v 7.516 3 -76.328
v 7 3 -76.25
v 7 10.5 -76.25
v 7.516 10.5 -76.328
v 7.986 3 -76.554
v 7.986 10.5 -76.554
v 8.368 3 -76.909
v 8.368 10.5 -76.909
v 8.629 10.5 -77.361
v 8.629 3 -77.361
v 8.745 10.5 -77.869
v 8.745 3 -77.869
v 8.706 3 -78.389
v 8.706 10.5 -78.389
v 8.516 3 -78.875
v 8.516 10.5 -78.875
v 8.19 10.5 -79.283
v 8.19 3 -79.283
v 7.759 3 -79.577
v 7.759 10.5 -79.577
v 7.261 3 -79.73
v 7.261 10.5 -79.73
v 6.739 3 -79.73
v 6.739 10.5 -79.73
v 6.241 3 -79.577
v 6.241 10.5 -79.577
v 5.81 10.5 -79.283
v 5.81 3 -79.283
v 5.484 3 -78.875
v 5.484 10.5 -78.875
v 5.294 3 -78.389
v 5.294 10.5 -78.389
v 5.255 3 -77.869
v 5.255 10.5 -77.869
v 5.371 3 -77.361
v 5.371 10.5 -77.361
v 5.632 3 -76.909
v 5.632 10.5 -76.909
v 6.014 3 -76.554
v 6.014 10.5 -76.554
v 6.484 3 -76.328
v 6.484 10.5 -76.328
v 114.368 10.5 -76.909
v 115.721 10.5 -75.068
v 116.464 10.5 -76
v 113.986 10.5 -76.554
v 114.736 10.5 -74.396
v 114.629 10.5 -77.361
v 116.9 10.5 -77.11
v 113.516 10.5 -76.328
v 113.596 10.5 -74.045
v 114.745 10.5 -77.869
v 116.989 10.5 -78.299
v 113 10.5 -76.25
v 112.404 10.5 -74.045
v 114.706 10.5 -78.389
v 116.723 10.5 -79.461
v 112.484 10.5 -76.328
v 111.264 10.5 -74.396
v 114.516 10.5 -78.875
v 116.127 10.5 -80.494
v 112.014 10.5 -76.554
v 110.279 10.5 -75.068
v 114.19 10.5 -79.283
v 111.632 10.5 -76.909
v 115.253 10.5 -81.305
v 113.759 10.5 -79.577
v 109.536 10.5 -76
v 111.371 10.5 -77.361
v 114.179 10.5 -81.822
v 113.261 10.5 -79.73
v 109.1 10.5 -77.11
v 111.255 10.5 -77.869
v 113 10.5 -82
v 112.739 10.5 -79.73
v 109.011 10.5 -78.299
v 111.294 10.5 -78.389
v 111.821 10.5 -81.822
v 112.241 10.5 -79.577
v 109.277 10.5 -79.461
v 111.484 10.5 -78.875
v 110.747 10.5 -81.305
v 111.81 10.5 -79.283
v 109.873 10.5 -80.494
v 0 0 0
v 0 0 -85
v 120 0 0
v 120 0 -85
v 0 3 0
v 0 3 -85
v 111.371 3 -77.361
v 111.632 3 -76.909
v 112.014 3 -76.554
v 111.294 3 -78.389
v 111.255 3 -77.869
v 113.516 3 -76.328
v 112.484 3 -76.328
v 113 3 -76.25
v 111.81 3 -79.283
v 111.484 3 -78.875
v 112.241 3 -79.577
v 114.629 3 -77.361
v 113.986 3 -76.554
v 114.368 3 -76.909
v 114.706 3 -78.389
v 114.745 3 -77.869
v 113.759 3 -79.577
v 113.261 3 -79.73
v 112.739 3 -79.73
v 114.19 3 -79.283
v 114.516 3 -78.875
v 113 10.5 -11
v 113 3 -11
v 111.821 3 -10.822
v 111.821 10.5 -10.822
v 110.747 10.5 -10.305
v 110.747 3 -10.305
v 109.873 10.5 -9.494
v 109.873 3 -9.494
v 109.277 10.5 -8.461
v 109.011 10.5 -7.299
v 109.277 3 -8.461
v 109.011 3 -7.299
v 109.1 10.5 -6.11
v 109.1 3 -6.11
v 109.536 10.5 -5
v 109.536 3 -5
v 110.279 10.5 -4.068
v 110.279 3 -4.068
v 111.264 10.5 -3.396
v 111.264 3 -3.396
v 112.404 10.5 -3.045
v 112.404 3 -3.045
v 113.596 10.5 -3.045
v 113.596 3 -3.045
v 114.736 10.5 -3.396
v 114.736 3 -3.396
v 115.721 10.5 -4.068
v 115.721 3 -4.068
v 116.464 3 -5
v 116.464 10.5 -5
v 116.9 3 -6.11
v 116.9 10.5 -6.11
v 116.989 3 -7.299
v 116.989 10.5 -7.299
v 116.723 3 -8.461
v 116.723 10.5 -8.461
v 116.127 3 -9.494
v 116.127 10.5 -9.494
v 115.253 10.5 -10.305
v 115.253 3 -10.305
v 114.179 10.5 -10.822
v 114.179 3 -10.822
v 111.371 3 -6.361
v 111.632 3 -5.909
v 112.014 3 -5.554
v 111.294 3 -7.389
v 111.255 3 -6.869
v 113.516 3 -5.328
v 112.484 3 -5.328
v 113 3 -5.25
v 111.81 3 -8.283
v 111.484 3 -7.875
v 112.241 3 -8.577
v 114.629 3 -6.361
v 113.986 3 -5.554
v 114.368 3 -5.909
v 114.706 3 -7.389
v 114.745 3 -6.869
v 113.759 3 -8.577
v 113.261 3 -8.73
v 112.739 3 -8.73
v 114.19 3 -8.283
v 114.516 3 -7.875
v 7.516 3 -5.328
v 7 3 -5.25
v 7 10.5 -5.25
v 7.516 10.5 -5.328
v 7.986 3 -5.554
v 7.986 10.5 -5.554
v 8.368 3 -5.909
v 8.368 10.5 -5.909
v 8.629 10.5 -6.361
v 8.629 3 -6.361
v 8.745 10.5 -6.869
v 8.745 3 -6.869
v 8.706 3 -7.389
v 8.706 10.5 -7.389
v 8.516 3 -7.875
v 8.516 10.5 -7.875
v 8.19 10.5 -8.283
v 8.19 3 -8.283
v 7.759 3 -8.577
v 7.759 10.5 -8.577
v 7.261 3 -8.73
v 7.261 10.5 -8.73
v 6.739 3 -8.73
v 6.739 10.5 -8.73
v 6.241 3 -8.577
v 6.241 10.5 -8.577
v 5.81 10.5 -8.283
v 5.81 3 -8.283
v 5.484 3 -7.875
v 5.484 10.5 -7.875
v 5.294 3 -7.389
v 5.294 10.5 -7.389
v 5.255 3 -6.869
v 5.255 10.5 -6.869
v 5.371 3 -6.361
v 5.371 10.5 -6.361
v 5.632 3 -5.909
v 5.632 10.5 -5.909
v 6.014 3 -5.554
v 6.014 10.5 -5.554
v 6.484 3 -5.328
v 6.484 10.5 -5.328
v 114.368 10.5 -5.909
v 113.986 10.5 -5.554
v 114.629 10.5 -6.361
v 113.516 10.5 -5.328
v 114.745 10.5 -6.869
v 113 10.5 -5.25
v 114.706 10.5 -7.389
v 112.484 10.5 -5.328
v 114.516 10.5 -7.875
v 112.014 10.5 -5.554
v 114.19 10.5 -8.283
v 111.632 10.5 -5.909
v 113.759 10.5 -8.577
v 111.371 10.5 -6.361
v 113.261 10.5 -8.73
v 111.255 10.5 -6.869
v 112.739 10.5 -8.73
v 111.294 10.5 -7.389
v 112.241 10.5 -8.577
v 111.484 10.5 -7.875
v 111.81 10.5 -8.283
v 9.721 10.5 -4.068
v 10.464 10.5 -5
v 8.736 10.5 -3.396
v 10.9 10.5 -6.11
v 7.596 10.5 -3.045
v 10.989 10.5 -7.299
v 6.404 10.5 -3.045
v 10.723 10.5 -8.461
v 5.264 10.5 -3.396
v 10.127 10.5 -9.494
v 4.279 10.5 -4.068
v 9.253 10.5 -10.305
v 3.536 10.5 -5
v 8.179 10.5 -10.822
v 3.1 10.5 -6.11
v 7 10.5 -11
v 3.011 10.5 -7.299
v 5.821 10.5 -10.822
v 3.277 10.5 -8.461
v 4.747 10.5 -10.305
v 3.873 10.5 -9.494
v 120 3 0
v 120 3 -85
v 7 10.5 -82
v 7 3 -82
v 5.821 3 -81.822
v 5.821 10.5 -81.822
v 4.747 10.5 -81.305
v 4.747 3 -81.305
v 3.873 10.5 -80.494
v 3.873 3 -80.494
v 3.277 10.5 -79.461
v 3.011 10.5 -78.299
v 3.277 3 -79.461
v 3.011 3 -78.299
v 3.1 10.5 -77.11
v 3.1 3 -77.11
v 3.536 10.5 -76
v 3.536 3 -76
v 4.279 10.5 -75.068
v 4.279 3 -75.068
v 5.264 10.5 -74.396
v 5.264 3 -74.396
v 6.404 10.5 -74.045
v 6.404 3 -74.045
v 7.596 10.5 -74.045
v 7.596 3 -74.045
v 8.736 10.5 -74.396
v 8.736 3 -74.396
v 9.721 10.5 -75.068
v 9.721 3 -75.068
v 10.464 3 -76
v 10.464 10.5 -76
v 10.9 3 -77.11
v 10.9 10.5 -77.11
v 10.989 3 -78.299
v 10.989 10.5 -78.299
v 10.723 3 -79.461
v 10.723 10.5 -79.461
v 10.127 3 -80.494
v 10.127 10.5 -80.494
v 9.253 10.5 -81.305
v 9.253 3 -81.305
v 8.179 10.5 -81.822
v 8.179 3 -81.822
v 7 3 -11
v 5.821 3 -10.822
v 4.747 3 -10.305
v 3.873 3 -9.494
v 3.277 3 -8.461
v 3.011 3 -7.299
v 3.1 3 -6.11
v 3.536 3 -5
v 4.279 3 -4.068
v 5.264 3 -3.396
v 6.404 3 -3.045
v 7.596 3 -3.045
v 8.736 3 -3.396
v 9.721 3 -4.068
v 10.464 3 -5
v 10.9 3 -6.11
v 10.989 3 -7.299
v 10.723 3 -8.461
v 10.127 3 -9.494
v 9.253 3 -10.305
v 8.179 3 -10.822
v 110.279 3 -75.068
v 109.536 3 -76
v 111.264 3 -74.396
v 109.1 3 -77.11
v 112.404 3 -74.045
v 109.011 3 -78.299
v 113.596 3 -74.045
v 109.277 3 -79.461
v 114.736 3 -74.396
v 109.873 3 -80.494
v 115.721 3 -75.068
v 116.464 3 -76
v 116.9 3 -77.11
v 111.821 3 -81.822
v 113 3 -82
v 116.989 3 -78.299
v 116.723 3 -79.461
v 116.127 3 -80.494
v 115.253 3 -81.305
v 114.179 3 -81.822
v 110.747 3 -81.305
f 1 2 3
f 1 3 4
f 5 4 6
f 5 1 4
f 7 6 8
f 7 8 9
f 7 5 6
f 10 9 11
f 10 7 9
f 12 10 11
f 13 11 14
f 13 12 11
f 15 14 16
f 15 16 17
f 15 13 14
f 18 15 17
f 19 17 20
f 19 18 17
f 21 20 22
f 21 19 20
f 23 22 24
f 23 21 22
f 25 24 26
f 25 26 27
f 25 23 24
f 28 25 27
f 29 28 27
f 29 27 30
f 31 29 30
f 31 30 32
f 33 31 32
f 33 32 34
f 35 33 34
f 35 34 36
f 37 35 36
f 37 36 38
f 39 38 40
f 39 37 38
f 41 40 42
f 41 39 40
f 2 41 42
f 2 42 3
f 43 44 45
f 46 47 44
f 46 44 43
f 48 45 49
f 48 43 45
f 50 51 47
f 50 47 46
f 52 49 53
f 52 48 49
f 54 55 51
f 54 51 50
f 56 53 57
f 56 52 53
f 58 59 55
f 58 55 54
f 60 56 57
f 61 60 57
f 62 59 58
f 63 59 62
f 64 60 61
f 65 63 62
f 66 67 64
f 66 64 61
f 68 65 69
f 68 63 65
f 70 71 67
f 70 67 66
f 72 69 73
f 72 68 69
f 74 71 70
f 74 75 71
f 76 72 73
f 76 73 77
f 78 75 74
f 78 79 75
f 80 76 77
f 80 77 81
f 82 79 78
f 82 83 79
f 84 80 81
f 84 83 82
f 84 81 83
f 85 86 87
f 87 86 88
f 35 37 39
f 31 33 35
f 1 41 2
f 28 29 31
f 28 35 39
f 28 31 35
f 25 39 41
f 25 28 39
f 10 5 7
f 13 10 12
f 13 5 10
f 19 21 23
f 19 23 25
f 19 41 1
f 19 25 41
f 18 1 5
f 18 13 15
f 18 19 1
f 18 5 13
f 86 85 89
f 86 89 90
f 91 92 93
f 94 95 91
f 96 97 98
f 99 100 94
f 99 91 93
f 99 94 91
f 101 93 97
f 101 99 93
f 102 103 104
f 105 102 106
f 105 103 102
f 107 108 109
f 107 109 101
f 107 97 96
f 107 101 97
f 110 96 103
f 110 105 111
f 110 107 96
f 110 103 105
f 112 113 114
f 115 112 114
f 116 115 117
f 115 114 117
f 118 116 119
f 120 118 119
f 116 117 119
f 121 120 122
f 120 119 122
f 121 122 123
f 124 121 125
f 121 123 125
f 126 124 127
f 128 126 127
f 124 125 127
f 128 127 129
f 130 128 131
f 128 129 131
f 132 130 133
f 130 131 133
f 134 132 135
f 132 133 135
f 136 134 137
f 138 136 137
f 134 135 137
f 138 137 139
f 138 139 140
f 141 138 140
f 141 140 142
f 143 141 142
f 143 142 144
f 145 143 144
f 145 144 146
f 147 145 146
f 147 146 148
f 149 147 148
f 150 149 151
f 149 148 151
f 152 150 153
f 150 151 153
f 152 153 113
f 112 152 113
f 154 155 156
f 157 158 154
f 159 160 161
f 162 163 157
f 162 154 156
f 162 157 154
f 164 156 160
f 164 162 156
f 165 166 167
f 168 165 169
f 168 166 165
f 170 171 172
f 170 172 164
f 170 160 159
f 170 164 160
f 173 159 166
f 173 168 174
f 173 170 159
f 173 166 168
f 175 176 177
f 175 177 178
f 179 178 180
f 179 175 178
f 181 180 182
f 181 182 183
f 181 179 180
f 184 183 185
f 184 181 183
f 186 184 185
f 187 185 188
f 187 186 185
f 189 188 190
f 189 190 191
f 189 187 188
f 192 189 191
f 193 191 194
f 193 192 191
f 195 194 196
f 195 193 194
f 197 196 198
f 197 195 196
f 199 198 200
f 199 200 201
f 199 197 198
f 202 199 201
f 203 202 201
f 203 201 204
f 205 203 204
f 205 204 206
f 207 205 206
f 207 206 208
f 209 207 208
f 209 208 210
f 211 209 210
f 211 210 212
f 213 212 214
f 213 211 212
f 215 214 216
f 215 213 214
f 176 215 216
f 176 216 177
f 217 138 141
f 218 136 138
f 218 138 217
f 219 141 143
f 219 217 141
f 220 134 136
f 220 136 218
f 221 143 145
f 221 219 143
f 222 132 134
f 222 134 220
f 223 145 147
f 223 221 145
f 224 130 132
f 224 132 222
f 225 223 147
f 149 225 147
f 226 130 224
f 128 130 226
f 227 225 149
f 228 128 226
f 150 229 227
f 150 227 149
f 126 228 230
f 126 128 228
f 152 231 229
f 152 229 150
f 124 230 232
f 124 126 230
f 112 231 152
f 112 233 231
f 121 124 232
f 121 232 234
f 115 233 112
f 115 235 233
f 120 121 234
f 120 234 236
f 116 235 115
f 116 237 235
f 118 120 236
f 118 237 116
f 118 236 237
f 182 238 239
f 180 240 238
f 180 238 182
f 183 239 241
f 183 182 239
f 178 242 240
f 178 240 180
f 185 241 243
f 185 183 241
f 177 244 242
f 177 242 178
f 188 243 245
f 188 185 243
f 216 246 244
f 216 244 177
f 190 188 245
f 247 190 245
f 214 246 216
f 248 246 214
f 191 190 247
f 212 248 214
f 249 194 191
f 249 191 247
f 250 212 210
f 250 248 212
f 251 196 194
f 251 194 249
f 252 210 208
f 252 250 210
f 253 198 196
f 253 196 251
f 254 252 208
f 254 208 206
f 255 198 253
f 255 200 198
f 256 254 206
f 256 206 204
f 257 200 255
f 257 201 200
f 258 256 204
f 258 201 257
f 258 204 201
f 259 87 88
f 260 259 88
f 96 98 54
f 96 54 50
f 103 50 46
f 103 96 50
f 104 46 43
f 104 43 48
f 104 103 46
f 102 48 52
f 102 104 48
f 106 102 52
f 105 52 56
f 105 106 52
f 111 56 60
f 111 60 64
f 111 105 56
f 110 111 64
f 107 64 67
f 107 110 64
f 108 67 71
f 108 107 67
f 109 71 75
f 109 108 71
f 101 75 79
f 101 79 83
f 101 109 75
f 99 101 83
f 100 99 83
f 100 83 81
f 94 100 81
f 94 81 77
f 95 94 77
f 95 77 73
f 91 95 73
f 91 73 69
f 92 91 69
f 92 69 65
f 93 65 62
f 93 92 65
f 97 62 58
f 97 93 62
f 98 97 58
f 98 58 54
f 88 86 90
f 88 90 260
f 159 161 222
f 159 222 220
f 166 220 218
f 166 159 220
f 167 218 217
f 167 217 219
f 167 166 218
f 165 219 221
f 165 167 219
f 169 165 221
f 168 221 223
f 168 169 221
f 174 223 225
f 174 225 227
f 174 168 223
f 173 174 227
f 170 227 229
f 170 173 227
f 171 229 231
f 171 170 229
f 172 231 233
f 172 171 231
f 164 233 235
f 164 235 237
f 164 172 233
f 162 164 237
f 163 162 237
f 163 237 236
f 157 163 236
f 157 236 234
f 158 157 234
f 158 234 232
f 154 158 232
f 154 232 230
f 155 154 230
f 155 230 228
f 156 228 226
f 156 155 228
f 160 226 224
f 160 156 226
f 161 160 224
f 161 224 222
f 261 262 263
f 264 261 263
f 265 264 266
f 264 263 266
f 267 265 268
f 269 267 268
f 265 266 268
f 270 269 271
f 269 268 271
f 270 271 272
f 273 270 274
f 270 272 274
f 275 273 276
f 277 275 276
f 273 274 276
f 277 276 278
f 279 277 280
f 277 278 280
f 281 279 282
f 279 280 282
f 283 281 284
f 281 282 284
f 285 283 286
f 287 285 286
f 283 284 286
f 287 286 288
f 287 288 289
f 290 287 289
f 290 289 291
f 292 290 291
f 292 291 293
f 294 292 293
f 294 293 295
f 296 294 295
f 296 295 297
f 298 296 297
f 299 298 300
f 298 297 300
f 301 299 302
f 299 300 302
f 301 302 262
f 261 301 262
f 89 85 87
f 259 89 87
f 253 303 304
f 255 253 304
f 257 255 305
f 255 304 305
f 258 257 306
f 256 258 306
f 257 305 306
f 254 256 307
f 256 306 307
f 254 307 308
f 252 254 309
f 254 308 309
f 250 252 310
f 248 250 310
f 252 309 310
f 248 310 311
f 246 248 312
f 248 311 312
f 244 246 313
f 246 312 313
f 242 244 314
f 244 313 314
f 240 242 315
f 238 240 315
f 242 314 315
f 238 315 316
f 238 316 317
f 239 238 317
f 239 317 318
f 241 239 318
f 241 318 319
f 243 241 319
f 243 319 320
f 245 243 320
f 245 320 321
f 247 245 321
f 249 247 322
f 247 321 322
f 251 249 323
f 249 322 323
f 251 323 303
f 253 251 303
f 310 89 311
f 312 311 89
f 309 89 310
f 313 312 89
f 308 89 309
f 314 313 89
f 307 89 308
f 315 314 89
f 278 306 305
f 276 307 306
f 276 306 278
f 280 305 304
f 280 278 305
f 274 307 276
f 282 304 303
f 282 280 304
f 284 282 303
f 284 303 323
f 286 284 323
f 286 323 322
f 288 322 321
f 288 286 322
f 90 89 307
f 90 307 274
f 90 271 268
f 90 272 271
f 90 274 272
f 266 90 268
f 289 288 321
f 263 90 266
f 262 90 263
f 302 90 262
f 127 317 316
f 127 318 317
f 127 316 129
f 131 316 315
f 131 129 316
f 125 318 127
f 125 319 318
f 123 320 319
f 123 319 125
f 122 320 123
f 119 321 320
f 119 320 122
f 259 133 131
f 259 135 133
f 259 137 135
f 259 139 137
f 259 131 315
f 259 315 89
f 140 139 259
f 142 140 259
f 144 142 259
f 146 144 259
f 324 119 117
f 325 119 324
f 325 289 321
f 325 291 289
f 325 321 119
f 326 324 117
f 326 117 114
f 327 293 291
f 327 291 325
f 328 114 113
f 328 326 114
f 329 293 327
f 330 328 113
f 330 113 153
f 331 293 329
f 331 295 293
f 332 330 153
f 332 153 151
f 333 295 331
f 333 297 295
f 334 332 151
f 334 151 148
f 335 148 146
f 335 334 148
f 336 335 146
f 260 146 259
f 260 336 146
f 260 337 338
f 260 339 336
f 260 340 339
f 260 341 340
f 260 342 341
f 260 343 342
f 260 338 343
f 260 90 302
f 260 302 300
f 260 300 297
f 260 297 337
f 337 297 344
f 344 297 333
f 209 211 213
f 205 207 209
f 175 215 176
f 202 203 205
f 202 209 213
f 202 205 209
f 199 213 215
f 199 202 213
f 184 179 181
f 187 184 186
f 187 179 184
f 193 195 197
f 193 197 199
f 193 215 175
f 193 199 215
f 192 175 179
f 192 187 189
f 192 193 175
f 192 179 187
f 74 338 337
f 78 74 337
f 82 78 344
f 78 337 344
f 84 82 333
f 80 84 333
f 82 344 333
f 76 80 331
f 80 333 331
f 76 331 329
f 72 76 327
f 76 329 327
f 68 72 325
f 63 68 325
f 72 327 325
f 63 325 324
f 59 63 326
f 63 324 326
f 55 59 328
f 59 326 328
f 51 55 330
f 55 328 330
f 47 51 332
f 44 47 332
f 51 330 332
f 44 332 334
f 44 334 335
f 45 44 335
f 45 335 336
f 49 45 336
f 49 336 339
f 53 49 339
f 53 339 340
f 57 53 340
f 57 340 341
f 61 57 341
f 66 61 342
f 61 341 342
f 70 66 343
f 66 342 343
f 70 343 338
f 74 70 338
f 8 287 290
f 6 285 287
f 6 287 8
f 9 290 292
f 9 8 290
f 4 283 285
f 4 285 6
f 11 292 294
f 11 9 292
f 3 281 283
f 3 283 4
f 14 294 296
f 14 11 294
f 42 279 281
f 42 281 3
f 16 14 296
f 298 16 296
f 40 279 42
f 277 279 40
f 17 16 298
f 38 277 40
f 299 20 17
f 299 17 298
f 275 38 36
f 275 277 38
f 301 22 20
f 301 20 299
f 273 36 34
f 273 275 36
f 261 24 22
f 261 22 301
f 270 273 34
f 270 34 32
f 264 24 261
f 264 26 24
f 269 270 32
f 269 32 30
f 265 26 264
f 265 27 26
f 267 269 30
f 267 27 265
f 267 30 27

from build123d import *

# Parameters (mm, degrees)
SKETCH1_W           = 120
SKETCH1_H           = 85
BOSS_EXTRUDE1_DEPTH = 3
SKETCH2_R           = 4
SKETCH2_R_2         = 1.75
BOSS_EXTRUDE2_DEPTH = 7.5


with BuildPart() as part:
    # Sketch1 → Boss-Extrude1 (new body)
    with BuildSketch(Plane(origin=(0, 0, 0), x_dir=(1, 0, 0), z_dir=(0, 1, 0))):
        with Locations((60, 42.5)):
            Rectangle(SKETCH1_W, SKETCH1_H)
    extrude(amount=BOSS_EXTRUDE1_DEPTH)

    # Sketch2 → Boss-Extrude2 (add)
    # profile 1 of 4: a face of its own
    with BuildSketch(Plane(origin=(0, 3, 0), x_dir=(1, 0, 0), z_dir=(0, 1, 0))):
        with Locations(Location((7, 78, 0), (0, 0, 90))):
            Circle(SKETCH2_R)
        with Locations(Location((7, 78, 0), (0, 0, 270))):
            Circle(SKETCH2_R_2, mode=Mode.SUBTRACT)
    # profile 2 of 4: a face of its own
    with BuildSketch(Plane(origin=(0, 3, 0), x_dir=(1, 0, 0), z_dir=(0, 1, 0))):
        with Locations(Location((7, 7, 0), (0, 0, 90))):
            Circle(SKETCH2_R)
        with Locations(Location((7, 7, 0), (0, 0, 270))):
            Circle(SKETCH2_R_2, mode=Mode.SUBTRACT)
    # profile 3 of 4: a face of its own
    with BuildSketch(Plane(origin=(0, 3, 0), x_dir=(1, 0, 0), z_dir=(0, 1, 0))):
        with Locations(Location((113, 7, 0), (0, 0, 90))):
            Circle(SKETCH2_R)
        with Locations(Location((113, 7, 0), (0, 0, 270))):
            Circle(SKETCH2_R_2, mode=Mode.SUBTRACT)
    # profile 4 of 4: a face of its own
    with BuildSketch(Plane(origin=(0, 3, 0), x_dir=(1, 0, 0), z_dir=(0, 1, 0))):
        with Locations(Location((113, 78, 0), (0, 0, 90))):
            Circle(SKETCH2_R)
        with Locations(Location((113, 78, 0), (0, 0, 270))):
            Circle(SKETCH2_R_2, mode=Mode.SUBTRACT)
    extrude(amount=BOSS_EXTRUDE2_DEPTH)


solid = part.part
